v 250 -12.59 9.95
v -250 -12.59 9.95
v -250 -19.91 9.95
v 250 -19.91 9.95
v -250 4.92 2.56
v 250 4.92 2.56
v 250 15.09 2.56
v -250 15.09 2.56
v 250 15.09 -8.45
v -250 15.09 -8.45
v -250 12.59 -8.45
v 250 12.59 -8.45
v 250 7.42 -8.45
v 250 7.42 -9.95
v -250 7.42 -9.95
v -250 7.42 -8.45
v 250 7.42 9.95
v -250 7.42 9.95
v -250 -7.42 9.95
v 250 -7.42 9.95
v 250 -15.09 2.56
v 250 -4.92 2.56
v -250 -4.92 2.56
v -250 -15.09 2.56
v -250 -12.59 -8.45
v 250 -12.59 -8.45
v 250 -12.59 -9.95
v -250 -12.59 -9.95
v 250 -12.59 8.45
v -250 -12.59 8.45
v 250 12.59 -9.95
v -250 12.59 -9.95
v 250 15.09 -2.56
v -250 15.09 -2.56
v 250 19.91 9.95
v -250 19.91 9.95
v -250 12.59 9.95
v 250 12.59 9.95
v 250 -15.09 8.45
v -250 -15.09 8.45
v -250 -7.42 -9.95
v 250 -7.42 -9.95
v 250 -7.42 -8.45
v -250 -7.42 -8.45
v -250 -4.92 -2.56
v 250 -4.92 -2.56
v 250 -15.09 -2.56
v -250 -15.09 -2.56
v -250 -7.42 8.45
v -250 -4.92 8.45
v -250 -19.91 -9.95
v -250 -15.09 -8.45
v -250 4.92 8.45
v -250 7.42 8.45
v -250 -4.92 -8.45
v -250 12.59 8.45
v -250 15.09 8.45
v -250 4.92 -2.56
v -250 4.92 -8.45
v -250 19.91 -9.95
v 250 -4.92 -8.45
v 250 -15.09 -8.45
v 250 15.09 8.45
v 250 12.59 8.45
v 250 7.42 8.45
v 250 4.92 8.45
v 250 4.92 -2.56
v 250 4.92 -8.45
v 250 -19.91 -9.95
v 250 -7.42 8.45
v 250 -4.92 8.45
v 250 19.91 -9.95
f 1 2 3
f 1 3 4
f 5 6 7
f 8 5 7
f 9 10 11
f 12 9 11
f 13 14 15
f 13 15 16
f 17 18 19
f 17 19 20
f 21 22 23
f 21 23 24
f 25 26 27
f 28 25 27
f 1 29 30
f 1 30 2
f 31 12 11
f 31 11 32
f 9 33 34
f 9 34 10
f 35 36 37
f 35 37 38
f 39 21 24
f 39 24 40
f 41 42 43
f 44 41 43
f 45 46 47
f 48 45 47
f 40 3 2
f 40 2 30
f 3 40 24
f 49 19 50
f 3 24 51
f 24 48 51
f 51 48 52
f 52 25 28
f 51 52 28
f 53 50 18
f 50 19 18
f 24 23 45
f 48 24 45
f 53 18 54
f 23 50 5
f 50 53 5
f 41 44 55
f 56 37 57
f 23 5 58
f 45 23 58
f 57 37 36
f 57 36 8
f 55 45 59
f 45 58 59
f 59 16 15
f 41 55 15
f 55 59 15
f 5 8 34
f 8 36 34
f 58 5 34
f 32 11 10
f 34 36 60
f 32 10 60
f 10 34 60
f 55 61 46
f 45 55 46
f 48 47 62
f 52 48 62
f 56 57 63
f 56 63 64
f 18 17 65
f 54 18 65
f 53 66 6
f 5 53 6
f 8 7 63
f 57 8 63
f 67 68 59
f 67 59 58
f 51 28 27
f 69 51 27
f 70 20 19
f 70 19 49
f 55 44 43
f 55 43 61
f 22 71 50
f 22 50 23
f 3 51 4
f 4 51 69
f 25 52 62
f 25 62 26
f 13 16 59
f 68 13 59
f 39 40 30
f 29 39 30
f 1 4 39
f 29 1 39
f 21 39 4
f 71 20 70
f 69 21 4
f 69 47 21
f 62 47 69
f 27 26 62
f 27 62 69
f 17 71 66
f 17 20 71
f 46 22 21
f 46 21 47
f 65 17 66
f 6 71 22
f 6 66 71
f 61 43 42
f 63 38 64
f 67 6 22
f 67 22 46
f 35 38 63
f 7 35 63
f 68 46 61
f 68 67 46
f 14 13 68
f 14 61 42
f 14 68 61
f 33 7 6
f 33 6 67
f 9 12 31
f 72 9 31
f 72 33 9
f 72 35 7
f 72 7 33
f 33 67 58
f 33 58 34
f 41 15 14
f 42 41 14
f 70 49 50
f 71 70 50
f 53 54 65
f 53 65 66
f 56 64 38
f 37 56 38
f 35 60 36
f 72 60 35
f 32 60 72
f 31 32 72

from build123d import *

# Parameters (mm, degrees)
SKETCH1_W            = 500
SKETCH1_H            = 19.9
BOSS_EXTRUDE1_DEPTH  = 19.91
CUT_EXTRUDE1_DEPTH   = 501.495165411
MIRROR2_COPY_1_DEPTH = 501.495165411


with BuildPart() as part:
    # Sketch1 → Boss-Extrude1 (new, symmetric)
    with BuildSketch(Plane(origin=(0, 0, 0), x_dir=(1, 0, 0), z_dir=(0, 1, 0))):
        Rectangle(SKETCH1_W, SKETCH1_H)
    extrude(amount=BOSS_EXTRUDE1_DEPTH, both=True)

    # Sketch2 → Cut-Extrude1 (cut, through all)
    with BuildSketch(Plane(origin=(250, 0, 0), x_dir=(0, 0, -1), z_dir=(1, 0, 0))):
        Polygon((-9.95, 7.42), (-8.45, 7.42), (-8.45, 4.92), (-2.56, 4.92), (-2.56, 15.09), (-8.45, 15.09), (-8.45, 12.59), (-9.95, 12.59), align=None)
    cut_extrude1 = extrude(amount=-CUT_EXTRUDE1_DEPTH, mode=Mode.SUBTRACT)

    # Mirror1: Cut-Extrude1 across plane
    add(cut_extrude1.mirror(Plane.XY), mode=Mode.SUBTRACT)

    # Mirror2: Cut-Extrude1 across plane
    add(cut_extrude1.mirror(Plane.ZX), mode=Mode.SUBTRACT)

    # Mirror2 copy 1 sketch → Mirror2 copy 1 (cut, through all)
    with BuildSketch(Plane(origin=(250, 0, 0), x_dir=(0, 0, 1), z_dir=(1, 0, 0))):
        Polygon((-9.95, 7.42), (-8.45, 7.42), (-8.45, 4.92), (-2.56, 4.92), (-2.56, 15.09), (-8.45, 15.09), (-8.45, 12.59), (-9.95, 12.59), align=None)
    extrude(amount=-MIRROR2_COPY_1_DEPTH, mode=Mode.SUBTRACT)


solid = part.part
